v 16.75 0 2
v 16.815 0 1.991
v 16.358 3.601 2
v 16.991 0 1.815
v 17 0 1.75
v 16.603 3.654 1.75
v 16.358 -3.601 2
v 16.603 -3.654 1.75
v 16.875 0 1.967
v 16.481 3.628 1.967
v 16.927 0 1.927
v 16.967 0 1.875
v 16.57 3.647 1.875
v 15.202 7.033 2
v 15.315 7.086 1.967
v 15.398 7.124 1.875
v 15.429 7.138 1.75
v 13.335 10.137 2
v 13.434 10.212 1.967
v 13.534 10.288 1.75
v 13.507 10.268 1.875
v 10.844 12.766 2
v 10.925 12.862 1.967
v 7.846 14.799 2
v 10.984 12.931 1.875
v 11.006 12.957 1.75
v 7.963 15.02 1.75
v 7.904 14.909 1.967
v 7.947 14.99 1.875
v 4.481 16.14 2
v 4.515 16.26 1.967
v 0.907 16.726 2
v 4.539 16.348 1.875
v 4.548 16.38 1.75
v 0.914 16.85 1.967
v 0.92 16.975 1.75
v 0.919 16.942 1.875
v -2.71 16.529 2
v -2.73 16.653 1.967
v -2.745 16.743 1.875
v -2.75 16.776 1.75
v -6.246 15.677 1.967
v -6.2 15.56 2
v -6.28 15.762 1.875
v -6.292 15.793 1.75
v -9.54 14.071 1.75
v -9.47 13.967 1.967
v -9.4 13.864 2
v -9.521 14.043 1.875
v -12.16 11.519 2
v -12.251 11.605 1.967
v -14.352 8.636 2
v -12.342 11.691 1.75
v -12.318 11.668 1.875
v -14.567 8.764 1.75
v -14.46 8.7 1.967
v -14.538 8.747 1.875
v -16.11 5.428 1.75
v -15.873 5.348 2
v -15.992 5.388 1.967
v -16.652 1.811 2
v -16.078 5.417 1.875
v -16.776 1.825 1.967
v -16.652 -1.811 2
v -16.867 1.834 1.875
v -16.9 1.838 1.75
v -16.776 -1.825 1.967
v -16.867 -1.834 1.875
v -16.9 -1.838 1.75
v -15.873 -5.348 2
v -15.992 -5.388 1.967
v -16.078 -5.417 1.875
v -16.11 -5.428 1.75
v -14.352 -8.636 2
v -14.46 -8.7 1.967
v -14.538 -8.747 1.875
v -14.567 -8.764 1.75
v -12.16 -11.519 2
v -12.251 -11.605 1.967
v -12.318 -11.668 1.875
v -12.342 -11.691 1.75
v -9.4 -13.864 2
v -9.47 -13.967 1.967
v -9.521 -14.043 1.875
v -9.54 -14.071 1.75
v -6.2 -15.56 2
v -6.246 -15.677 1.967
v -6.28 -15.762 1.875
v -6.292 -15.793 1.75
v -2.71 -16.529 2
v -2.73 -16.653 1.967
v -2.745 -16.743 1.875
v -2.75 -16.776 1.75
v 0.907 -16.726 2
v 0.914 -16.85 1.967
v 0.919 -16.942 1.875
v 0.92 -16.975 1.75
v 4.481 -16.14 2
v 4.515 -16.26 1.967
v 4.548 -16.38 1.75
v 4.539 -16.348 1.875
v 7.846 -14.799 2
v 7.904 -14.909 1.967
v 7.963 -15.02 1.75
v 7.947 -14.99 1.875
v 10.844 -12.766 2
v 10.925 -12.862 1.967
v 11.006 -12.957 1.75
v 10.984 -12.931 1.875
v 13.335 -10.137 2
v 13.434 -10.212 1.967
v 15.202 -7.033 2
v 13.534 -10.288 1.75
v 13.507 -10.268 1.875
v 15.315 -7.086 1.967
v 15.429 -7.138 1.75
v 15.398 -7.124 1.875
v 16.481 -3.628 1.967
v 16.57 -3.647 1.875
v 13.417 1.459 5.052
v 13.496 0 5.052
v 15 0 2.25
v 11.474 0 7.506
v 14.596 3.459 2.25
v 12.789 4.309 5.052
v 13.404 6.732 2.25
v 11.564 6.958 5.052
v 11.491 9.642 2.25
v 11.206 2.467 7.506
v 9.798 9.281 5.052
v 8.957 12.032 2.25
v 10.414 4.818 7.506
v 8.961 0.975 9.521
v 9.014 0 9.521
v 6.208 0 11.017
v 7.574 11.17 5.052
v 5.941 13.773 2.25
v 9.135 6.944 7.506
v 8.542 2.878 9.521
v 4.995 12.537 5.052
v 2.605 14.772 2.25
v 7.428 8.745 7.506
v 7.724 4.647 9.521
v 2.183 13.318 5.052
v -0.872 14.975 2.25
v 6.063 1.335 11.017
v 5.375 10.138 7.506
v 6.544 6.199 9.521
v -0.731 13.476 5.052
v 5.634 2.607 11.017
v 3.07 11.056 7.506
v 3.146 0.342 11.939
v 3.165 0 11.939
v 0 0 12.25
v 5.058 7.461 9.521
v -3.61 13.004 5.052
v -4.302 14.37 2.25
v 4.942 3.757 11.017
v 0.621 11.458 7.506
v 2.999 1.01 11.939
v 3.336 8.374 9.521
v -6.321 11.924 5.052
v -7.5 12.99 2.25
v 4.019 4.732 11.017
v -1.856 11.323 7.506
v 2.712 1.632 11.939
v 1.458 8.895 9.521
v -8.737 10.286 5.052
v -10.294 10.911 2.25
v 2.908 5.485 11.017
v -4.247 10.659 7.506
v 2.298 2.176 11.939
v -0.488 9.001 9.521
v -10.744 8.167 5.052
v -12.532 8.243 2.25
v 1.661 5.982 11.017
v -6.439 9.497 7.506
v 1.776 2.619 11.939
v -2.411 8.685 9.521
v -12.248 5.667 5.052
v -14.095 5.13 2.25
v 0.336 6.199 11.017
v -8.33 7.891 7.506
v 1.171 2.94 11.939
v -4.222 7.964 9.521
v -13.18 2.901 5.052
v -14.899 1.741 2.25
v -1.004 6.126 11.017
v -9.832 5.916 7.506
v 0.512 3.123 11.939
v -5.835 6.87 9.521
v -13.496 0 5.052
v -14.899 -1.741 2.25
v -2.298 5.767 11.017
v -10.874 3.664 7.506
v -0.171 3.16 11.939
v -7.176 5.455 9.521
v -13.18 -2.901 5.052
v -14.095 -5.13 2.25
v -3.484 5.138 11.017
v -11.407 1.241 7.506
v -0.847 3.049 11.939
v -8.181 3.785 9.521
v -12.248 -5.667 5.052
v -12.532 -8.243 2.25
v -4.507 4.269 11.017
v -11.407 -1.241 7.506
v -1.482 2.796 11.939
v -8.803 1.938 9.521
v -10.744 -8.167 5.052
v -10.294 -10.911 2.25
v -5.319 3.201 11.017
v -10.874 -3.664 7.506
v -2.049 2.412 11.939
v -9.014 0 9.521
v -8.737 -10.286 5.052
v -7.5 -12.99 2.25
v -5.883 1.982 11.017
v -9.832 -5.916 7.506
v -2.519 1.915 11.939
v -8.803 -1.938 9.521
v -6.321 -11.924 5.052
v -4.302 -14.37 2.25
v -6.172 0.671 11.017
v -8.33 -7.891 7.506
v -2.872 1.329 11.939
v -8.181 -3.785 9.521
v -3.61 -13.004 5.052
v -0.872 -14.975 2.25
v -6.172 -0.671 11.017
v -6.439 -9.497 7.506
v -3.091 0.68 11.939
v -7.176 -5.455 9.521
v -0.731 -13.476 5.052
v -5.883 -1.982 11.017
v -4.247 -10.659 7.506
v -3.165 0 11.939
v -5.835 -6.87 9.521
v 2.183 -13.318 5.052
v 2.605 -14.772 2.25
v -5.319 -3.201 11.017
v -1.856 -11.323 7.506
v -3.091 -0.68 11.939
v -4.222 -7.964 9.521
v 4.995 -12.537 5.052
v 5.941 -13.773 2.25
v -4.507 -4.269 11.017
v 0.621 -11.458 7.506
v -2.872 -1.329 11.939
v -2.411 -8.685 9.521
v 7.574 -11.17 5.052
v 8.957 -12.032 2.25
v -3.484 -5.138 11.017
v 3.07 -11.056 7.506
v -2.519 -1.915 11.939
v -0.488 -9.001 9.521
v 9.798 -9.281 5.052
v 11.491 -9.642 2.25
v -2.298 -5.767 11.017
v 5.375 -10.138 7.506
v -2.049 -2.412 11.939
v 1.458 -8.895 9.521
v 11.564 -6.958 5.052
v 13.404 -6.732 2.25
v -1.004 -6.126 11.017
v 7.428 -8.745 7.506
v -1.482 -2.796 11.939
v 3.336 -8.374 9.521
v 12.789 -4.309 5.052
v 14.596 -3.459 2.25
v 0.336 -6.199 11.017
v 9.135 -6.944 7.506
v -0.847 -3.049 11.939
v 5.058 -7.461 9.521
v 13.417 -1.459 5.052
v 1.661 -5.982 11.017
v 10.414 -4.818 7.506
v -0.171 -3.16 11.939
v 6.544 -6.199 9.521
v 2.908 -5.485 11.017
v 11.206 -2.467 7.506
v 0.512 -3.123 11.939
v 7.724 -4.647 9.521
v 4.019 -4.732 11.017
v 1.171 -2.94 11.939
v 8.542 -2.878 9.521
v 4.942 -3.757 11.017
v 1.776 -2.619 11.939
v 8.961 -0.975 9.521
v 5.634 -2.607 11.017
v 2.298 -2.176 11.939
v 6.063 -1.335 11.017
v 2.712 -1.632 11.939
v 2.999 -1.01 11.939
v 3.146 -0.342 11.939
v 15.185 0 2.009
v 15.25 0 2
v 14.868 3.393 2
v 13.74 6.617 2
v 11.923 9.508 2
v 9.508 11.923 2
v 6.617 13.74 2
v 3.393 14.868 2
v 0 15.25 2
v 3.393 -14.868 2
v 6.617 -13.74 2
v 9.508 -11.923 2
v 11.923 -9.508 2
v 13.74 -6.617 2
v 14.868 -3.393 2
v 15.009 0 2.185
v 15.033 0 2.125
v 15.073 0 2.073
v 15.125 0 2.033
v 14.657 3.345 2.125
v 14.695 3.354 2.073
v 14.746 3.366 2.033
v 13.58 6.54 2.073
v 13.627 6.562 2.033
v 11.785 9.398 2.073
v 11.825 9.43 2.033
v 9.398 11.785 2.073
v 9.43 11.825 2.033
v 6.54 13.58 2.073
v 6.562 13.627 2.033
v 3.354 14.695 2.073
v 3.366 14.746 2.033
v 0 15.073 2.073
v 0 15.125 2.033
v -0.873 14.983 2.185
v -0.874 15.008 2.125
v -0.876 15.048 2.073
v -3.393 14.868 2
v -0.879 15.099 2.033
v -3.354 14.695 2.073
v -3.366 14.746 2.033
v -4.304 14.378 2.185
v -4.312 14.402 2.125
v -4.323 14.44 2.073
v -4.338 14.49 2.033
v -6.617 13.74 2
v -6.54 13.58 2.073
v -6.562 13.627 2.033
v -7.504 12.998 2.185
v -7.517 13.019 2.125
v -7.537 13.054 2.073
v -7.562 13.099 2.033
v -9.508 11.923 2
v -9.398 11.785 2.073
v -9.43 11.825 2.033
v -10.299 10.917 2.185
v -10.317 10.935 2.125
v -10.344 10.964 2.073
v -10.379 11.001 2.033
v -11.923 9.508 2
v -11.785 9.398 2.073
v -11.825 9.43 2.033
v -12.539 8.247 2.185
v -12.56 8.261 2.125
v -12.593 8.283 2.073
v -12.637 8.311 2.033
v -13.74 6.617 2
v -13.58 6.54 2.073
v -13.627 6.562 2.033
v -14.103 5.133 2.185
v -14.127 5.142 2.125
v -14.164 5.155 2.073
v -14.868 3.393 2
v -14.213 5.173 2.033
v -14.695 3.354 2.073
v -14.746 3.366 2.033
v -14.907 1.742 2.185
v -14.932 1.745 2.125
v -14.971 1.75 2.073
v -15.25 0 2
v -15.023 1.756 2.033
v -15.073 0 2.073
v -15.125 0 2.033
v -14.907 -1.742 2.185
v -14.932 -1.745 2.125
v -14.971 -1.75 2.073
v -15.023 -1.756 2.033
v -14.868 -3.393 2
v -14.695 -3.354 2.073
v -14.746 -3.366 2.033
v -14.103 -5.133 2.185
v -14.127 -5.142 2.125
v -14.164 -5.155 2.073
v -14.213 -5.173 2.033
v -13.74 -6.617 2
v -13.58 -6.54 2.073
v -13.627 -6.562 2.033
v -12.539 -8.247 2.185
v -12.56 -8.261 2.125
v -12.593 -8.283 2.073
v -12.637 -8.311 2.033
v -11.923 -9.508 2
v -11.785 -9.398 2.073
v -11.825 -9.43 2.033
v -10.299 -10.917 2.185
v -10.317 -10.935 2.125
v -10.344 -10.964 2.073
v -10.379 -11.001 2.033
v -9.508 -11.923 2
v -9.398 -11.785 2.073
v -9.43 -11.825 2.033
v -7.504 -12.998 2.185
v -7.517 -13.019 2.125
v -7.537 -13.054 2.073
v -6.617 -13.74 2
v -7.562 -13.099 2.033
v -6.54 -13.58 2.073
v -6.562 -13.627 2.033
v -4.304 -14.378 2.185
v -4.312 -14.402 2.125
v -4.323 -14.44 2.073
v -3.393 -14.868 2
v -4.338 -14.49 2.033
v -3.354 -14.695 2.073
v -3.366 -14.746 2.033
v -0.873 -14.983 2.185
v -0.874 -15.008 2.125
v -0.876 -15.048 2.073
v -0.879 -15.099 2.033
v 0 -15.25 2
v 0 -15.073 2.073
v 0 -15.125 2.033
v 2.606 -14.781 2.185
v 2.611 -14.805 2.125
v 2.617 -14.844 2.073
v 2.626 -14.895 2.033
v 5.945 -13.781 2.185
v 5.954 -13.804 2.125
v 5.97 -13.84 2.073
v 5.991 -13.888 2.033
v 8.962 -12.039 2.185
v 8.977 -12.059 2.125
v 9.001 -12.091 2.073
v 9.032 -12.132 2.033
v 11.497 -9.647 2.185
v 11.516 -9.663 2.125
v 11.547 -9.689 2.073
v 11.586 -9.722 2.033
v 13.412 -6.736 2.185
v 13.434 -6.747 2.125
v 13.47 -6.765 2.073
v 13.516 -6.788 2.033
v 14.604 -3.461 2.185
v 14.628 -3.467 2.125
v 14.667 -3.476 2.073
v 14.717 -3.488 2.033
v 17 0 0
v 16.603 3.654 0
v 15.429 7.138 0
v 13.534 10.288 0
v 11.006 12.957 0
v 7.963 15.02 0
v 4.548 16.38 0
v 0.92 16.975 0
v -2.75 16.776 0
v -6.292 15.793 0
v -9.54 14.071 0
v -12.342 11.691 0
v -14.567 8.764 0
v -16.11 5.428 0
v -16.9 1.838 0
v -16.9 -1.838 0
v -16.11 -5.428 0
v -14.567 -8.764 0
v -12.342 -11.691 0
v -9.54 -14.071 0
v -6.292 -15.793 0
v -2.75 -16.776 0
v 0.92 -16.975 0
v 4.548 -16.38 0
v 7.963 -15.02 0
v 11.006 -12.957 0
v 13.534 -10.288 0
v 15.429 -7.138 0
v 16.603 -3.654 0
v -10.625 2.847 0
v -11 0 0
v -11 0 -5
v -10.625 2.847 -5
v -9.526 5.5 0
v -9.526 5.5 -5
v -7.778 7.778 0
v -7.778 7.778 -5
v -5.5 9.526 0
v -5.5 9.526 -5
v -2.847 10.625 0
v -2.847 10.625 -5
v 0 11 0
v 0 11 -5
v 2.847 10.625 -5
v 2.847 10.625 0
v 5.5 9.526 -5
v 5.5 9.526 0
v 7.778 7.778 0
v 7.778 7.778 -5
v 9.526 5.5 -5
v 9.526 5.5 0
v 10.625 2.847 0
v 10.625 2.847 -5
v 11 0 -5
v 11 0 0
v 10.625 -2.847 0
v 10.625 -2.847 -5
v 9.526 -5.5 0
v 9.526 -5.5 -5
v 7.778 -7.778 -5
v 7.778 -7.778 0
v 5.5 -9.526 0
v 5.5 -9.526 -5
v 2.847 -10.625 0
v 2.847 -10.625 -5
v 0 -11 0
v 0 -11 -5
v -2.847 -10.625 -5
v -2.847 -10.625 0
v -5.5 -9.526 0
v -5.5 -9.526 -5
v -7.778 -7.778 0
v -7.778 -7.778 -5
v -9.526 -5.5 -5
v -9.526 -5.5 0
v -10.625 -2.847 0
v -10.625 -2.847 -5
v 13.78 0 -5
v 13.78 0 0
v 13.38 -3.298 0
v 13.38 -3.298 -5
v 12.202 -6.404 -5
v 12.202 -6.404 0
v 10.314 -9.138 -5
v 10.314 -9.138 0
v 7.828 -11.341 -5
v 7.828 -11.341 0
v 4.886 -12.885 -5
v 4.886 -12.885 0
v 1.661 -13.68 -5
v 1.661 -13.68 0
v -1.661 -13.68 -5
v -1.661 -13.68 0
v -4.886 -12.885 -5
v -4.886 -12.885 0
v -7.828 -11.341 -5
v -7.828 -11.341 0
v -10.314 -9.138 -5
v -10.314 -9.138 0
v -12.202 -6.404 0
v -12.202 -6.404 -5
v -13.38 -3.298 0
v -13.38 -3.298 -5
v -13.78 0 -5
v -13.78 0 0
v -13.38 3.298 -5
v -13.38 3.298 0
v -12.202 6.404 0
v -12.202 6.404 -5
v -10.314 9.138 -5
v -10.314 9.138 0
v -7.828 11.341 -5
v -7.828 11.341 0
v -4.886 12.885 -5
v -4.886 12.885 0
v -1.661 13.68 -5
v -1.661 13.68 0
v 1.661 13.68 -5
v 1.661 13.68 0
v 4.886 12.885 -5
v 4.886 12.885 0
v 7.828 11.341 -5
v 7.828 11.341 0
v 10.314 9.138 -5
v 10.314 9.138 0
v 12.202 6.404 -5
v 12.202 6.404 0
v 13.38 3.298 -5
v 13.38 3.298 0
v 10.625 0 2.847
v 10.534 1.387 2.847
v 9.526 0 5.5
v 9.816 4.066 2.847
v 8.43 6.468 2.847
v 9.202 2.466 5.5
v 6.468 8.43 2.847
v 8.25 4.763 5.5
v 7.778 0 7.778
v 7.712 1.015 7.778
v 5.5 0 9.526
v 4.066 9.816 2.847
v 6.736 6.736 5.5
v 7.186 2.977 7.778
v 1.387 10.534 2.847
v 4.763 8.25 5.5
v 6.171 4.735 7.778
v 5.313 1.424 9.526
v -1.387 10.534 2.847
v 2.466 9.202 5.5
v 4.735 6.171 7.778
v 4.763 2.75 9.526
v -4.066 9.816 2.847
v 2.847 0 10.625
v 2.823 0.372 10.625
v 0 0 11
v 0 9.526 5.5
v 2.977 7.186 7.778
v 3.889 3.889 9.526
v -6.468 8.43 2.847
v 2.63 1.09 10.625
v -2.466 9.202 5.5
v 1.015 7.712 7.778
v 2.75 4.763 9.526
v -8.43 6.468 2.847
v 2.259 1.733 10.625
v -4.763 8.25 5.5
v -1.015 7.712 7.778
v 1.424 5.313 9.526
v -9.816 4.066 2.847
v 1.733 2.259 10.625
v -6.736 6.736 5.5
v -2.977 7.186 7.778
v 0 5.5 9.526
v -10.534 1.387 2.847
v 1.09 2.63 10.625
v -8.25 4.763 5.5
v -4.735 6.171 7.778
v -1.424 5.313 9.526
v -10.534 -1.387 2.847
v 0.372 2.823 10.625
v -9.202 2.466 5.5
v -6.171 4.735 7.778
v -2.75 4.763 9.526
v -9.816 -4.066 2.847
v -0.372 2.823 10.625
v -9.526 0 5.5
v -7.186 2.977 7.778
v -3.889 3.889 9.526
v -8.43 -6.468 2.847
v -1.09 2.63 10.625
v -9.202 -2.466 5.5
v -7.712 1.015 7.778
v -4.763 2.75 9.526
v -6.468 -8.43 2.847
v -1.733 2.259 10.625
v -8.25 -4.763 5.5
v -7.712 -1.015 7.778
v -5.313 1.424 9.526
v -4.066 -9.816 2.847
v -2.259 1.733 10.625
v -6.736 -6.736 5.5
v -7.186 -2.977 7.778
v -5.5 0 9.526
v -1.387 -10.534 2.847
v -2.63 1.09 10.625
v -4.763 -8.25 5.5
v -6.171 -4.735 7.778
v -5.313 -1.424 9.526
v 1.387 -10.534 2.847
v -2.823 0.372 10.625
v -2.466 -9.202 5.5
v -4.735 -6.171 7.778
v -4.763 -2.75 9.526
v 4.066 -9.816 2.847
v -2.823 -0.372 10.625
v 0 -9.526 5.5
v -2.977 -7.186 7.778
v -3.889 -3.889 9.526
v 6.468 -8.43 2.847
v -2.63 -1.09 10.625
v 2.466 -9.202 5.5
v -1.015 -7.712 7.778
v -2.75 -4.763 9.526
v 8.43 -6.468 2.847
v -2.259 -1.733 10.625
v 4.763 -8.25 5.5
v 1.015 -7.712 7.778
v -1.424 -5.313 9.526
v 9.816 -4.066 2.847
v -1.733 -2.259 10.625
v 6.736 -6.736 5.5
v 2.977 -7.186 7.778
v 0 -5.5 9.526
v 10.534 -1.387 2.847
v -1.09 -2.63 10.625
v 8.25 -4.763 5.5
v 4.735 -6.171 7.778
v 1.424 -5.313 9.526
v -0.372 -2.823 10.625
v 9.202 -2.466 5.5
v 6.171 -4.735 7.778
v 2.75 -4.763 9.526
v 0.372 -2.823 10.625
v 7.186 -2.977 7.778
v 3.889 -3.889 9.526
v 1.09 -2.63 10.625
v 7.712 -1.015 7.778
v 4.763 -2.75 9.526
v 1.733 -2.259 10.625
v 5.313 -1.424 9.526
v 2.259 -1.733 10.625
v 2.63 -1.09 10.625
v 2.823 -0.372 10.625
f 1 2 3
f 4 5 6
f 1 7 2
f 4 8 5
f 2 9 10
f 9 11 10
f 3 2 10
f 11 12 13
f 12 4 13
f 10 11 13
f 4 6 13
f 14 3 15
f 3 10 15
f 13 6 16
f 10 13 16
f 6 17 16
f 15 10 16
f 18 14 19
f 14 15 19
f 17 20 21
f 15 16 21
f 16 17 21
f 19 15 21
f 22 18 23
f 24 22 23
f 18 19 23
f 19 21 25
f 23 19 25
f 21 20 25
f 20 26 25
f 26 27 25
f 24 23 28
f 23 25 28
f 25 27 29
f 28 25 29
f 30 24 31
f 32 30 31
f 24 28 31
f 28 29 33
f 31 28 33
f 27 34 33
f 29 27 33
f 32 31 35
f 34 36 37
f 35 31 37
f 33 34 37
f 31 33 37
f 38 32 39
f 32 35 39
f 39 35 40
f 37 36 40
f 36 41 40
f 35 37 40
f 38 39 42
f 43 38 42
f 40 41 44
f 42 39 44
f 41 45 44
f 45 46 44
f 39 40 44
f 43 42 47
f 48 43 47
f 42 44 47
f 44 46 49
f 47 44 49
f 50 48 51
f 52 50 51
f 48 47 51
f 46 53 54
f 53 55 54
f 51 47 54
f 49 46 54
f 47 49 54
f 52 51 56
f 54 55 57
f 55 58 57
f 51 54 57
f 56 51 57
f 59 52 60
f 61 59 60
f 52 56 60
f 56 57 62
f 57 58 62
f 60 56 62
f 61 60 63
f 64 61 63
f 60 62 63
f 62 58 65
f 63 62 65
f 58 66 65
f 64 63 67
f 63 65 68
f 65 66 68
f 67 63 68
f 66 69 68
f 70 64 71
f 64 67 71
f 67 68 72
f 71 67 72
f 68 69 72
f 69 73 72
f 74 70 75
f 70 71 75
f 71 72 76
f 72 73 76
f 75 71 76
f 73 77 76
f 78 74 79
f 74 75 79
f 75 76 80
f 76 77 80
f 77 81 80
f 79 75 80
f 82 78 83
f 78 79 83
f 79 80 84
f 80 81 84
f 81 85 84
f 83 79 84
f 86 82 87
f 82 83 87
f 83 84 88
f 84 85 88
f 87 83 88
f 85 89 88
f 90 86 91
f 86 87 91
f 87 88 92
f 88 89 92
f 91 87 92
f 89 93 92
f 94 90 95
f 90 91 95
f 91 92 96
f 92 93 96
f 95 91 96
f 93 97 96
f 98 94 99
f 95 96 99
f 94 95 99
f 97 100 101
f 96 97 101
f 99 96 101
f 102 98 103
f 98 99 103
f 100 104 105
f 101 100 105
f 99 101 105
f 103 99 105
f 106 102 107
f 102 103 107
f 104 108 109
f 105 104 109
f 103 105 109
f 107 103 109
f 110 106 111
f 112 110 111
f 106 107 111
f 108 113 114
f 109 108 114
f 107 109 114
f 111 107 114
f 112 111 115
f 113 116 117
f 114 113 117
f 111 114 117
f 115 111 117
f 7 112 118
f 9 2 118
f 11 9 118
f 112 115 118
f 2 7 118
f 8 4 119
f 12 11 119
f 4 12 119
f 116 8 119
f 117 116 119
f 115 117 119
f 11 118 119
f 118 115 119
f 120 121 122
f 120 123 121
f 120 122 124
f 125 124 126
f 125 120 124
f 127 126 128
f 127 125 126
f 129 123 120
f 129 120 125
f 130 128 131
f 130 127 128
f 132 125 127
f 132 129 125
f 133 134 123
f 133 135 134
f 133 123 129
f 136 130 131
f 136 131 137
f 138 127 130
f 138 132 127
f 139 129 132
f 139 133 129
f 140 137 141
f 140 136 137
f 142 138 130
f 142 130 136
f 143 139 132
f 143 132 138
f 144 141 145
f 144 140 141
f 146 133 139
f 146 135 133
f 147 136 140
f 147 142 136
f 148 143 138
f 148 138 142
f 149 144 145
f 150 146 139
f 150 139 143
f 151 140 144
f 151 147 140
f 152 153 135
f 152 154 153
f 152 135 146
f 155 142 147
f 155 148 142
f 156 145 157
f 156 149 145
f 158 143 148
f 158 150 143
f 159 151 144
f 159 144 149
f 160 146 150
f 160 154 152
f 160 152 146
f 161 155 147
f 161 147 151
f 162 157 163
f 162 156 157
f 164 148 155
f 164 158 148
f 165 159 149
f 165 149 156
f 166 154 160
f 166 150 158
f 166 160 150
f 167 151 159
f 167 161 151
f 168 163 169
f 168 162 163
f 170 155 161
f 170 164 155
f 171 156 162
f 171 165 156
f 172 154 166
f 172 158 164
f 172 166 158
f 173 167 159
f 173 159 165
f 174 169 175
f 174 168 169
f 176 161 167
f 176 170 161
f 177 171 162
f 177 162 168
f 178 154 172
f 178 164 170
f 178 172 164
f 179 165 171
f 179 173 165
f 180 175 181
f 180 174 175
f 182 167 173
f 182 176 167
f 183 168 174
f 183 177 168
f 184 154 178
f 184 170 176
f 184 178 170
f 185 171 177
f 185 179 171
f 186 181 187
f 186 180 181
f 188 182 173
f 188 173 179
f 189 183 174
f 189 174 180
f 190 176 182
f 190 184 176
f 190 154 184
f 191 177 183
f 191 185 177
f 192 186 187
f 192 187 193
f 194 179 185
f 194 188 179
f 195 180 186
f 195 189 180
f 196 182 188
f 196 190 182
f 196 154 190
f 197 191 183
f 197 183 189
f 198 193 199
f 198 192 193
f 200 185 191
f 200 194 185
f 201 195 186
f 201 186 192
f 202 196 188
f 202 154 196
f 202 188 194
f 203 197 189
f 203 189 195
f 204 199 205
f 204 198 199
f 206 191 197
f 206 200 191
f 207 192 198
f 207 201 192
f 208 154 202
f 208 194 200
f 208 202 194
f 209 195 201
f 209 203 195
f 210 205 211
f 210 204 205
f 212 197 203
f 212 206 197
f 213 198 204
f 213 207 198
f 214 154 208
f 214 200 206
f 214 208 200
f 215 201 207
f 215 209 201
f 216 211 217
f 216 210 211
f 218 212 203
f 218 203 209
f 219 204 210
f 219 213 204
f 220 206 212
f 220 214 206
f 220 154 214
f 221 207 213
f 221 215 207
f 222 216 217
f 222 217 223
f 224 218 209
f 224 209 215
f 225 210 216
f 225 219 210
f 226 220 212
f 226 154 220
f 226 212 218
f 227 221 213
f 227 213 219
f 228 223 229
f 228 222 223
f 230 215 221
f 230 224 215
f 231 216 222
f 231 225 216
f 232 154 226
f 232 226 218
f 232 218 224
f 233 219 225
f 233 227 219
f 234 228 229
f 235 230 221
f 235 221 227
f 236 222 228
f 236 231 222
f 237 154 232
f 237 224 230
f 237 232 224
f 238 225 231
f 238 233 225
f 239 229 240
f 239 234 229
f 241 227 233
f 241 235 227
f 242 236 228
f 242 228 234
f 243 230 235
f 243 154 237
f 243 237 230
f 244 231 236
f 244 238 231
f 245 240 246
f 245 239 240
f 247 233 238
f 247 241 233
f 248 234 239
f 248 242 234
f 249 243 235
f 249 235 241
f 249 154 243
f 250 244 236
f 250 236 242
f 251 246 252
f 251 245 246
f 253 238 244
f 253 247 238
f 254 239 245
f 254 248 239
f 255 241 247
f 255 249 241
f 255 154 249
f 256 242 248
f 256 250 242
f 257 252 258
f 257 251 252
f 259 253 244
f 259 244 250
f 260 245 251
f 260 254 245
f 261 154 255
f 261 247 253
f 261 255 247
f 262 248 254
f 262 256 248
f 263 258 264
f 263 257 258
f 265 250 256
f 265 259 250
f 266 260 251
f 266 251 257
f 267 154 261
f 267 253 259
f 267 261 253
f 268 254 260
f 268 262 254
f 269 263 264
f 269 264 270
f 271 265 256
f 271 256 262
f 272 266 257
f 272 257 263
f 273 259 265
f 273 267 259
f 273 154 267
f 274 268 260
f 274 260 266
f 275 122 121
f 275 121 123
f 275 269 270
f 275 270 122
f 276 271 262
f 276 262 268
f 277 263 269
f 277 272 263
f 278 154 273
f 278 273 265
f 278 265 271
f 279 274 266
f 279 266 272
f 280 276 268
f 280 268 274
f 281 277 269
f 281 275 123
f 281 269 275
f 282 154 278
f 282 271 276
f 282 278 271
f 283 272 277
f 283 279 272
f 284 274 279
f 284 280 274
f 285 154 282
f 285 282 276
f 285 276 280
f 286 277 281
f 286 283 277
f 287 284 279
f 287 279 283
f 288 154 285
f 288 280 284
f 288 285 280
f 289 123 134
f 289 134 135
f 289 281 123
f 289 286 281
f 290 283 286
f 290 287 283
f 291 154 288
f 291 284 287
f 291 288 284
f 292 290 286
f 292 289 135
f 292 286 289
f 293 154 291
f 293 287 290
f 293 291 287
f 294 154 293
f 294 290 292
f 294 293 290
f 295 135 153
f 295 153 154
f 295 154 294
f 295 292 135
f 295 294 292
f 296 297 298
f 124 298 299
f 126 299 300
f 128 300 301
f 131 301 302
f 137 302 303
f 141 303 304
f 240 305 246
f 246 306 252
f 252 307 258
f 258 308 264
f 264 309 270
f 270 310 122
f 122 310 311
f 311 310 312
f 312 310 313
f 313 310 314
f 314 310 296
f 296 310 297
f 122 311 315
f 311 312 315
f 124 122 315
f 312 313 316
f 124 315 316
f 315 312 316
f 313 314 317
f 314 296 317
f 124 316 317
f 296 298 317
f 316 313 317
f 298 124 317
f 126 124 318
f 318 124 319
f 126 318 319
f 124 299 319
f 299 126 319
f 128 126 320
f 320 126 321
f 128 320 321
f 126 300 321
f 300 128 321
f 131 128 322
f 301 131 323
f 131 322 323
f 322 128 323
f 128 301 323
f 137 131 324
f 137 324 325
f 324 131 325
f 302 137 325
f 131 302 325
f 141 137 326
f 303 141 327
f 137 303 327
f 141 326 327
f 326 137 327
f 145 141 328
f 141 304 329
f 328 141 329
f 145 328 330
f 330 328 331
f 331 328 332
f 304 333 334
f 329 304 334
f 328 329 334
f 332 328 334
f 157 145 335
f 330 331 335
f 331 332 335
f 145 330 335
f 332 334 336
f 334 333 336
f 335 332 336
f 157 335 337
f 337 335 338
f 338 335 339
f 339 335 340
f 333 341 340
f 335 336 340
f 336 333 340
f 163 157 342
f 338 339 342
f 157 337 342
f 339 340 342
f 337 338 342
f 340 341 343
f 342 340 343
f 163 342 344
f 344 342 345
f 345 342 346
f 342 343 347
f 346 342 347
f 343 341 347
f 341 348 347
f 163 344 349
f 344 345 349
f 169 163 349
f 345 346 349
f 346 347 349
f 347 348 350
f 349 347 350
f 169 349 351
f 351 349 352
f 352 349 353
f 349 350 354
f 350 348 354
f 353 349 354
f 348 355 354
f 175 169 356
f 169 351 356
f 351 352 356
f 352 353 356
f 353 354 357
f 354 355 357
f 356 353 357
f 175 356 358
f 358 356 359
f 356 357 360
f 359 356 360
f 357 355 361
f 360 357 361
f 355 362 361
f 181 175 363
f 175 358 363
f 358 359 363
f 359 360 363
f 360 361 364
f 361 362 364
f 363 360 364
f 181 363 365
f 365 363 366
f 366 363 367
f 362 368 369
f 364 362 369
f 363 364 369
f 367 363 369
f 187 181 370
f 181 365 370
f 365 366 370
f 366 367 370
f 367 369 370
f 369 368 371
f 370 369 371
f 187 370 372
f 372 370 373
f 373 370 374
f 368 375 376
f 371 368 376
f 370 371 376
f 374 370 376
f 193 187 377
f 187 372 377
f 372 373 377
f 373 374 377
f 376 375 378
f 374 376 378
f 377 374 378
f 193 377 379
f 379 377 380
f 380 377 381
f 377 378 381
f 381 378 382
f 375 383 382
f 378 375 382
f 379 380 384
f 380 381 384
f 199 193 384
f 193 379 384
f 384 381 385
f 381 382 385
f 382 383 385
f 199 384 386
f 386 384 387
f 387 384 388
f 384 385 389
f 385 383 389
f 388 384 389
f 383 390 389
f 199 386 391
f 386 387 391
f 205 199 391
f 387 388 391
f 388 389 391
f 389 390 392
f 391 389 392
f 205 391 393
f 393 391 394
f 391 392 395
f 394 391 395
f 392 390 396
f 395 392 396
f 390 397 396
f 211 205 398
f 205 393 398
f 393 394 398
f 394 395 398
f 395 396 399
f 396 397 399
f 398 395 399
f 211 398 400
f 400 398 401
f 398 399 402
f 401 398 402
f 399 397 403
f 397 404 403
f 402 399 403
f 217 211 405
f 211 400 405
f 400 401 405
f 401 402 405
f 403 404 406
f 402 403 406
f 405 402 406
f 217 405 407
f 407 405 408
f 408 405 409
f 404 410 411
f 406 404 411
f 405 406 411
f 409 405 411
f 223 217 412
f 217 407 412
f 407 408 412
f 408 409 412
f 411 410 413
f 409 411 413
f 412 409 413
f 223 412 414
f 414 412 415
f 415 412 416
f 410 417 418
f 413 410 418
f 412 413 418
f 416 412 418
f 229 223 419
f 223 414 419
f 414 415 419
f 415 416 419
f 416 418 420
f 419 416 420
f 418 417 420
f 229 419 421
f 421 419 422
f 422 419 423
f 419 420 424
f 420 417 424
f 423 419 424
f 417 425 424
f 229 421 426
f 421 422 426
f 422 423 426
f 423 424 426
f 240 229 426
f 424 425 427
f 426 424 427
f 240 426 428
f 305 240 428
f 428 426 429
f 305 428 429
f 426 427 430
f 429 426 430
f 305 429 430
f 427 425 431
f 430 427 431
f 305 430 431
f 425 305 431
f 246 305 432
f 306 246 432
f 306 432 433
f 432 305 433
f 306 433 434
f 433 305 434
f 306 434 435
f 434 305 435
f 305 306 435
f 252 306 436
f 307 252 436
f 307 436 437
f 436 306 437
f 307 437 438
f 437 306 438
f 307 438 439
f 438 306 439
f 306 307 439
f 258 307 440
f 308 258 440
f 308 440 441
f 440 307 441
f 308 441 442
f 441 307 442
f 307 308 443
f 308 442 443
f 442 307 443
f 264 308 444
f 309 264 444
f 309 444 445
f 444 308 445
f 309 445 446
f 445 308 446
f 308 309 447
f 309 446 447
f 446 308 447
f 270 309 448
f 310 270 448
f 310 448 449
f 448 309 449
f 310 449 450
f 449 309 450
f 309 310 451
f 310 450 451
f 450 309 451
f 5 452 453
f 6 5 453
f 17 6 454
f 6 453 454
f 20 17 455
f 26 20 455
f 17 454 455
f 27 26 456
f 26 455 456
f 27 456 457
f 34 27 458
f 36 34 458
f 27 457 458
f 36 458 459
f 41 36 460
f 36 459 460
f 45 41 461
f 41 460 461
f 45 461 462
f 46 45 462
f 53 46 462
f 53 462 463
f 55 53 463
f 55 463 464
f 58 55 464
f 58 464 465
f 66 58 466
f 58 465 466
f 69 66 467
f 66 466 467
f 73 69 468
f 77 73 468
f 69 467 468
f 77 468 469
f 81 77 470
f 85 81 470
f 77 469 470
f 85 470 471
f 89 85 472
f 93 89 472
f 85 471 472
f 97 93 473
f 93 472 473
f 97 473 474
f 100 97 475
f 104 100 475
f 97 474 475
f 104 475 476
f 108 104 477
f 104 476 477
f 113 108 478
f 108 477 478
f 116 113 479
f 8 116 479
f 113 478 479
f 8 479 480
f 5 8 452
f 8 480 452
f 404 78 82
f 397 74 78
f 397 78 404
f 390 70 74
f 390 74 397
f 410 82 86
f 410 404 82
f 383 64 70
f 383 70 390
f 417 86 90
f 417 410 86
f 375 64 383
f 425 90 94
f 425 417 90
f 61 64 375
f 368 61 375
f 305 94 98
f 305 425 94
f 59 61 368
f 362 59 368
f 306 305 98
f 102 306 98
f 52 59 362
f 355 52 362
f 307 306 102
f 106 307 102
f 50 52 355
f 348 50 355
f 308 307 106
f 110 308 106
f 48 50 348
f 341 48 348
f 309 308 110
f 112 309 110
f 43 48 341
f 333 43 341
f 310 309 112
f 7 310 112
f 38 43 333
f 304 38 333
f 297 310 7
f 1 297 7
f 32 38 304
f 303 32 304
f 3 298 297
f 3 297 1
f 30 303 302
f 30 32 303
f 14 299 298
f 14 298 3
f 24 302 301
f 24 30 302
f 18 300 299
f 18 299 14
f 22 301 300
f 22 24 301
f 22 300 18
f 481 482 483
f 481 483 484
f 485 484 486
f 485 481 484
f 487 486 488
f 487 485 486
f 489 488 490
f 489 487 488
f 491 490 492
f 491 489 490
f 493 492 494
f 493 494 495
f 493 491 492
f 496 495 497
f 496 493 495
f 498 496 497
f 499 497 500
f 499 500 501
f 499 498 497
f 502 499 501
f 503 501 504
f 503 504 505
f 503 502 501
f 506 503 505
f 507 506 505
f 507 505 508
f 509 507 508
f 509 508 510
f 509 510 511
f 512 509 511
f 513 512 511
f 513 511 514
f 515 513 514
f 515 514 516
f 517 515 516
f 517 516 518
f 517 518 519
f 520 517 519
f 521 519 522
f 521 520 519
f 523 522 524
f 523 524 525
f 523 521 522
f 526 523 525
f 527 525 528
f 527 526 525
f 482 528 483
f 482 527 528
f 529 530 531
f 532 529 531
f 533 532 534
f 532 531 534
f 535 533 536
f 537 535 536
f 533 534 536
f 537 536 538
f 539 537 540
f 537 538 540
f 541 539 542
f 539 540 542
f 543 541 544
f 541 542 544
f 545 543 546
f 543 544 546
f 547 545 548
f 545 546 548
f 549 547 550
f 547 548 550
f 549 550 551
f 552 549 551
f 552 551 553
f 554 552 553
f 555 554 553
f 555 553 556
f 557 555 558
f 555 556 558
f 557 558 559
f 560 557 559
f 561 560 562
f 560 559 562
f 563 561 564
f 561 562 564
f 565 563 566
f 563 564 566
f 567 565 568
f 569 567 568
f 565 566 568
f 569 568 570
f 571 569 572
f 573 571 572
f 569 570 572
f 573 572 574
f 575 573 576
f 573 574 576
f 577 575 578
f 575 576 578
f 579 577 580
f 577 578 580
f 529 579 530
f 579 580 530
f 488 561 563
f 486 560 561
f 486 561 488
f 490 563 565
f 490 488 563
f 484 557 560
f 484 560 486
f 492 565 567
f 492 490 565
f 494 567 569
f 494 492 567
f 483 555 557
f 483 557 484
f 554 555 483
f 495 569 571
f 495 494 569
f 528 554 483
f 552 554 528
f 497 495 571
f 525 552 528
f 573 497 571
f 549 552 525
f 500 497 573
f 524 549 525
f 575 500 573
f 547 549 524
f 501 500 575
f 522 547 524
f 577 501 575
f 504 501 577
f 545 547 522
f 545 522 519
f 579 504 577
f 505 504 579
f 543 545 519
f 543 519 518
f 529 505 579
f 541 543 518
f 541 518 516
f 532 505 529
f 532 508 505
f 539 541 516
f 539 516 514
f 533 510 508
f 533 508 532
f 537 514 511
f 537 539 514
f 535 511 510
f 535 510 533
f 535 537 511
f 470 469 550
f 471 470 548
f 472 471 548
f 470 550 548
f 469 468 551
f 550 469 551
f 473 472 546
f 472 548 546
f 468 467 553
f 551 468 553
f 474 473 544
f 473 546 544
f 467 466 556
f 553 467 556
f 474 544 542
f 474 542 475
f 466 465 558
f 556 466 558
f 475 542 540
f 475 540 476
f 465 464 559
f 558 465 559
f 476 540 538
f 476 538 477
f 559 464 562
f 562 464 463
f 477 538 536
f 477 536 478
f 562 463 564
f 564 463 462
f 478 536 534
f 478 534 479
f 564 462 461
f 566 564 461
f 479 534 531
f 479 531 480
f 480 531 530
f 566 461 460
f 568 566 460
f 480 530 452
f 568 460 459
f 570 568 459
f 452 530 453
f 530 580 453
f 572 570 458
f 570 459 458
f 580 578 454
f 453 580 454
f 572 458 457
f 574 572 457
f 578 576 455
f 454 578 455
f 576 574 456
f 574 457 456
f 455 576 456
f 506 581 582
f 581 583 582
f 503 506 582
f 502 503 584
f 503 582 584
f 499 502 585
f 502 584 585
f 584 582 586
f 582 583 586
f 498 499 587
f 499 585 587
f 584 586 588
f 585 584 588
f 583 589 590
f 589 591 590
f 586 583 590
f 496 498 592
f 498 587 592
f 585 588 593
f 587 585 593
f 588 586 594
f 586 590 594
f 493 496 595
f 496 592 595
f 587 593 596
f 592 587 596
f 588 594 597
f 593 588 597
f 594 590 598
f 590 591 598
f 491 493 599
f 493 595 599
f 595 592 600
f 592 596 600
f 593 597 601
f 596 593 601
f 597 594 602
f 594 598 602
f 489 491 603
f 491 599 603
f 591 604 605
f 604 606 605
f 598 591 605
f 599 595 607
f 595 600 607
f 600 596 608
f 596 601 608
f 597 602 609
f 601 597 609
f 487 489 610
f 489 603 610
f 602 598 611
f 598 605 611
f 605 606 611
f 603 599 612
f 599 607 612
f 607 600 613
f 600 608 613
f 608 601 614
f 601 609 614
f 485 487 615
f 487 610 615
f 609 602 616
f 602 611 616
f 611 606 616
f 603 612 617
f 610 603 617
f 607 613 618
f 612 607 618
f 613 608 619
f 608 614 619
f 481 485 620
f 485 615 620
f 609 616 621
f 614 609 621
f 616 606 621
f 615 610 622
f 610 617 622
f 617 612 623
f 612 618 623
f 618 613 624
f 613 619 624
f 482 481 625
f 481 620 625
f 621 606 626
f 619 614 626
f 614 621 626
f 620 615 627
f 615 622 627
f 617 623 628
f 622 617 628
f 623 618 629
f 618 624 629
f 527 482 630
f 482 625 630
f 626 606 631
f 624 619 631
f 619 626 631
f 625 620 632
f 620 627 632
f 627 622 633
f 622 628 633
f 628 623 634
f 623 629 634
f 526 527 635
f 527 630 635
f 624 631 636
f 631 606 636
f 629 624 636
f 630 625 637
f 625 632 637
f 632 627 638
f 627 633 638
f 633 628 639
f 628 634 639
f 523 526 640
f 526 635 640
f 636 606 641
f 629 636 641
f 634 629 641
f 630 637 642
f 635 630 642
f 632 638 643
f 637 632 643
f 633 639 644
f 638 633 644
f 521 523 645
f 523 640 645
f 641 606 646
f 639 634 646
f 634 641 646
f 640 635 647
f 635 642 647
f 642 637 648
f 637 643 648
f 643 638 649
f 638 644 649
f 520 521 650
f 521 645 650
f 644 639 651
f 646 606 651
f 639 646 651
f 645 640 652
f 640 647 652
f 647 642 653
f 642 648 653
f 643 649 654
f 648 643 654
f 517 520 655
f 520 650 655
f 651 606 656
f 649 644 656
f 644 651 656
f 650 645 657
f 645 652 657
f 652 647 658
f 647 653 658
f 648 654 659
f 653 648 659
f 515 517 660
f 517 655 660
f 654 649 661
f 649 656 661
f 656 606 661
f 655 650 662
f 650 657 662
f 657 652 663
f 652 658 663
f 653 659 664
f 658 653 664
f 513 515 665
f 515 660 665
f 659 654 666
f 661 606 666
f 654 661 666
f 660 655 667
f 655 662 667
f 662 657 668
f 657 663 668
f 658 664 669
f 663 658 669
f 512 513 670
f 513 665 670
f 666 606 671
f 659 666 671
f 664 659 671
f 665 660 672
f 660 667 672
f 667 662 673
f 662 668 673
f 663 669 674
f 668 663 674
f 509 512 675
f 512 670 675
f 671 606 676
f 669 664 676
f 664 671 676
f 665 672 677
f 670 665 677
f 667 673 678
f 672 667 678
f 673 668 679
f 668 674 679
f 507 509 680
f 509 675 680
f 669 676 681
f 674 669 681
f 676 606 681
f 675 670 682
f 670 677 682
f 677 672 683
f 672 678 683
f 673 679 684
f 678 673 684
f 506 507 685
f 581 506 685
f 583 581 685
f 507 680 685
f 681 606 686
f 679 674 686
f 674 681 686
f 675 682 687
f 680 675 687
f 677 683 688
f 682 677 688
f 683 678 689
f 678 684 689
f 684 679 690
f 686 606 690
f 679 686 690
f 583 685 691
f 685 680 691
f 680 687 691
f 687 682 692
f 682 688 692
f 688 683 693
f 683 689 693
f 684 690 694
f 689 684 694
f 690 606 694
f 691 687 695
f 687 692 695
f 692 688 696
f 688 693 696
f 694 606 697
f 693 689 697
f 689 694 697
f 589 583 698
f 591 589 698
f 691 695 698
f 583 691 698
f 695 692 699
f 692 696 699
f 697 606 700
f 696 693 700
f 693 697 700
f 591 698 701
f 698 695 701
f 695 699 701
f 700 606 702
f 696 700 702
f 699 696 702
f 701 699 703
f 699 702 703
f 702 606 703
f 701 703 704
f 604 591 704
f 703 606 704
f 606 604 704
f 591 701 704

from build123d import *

# Parameters (mm, degrees)
ESQUISSE1_R        = 17
BOSS_EXTRU_1_DEPTH = 2
ESQUISSE2_R        = 13.78
ESQUISSE2_R_2      = 11
BOSS_EXTRU_2_DEPTH = 5
ESQUISSE3_R        = 15
BOSS_EXTRU_3_DEPTH = 0.25
D_ME1_FACE_RADIUS  = 15
D_ME1_HEIGHT       = 10
D_ME2_FACE_RADIUS  = 11
D_ME2_HEIGHT       = 11
CONG_1_R           = 0.25


with BuildPart() as part:
    # Esquisse1 → Boss.-Extru.1 (new body)
    with BuildSketch(Plane.XY):
        Circle(ESQUISSE1_R)
    extrude(amount=BOSS_EXTRU_1_DEPTH)

    # Esquisse2 → Boss.-Extru.2 (add)
    with BuildSketch(Plane(origin=(0, 0, 0), x_dir=(-1, 0, 0), z_dir=(0, 0, -1))):
        with Locations(Location((0, 0, 0), (0, 0, 180))):
            Circle(ESQUISSE2_R)
        Circle(ESQUISSE2_R_2, mode=Mode.SUBTRACT)
    extrude(amount=BOSS_EXTRU_2_DEPTH)

    # Esquisse3 → Boss.-Extru.3 (add)
    with BuildSketch(Plane.XY.offset(2)):
        Circle(ESQUISSE3_R)
    extrude(amount=BOSS_EXTRU_3_DEPTH)

    # Dôme1: a dome of height H over a round flat face of radius A is a cap of a sphere of radius (A * A + H * H) / (2 * H)
    d_me1_r = (D_ME1_FACE_RADIUS * D_ME1_FACE_RADIUS + D_ME1_HEIGHT * D_ME1_HEIGHT) / (2 * D_ME1_HEIGHT)
    d_me1_base = Plane((0, 0, 2.25), z_dir=(0, 0, 1))
    with Locations(d_me1_base.offset(D_ME1_HEIGHT - d_me1_r)):
        d_me1_ball = Sphere(d_me1_r, mode=Mode.PRIVATE)
    add(split(d_me1_ball, bisect_by=d_me1_base, keep=Keep.TOP, mode=Mode.PRIVATE))

    # Dôme2: a dome of height H over a round flat face of radius A is a cap of a sphere of radius (A * A + H * H) / (2 * H)
    d_me2_r = (D_ME2_FACE_RADIUS * D_ME2_FACE_RADIUS + D_ME2_HEIGHT * D_ME2_HEIGHT) / (2 * D_ME2_HEIGHT)
    d_me2_base = Plane((0, 0, 0), z_dir=(0, 0, 1))
    with Locations(d_me2_base.offset(D_ME2_HEIGHT - d_me2_r)):
        d_me2_ball = Sphere(d_me2_r, mode=Mode.PRIVATE)
    add(split(d_me2_ball, bisect_by=d_me2_base, keep=Keep.TOP, mode=Mode.PRIVATE), mode=Mode.SUBTRACT)

    # Congé1
    cong_1_edges = [part.edges().sort_by_distance(p)[0] for p in [
        (-15, 0, 2),
        (-17, 0, 2),
    ]]
    fillet(cong_1_edges, radius=CONG_1_R - 0.0001)  # a hair under: the kernel refuses the full size


solid = part.part
